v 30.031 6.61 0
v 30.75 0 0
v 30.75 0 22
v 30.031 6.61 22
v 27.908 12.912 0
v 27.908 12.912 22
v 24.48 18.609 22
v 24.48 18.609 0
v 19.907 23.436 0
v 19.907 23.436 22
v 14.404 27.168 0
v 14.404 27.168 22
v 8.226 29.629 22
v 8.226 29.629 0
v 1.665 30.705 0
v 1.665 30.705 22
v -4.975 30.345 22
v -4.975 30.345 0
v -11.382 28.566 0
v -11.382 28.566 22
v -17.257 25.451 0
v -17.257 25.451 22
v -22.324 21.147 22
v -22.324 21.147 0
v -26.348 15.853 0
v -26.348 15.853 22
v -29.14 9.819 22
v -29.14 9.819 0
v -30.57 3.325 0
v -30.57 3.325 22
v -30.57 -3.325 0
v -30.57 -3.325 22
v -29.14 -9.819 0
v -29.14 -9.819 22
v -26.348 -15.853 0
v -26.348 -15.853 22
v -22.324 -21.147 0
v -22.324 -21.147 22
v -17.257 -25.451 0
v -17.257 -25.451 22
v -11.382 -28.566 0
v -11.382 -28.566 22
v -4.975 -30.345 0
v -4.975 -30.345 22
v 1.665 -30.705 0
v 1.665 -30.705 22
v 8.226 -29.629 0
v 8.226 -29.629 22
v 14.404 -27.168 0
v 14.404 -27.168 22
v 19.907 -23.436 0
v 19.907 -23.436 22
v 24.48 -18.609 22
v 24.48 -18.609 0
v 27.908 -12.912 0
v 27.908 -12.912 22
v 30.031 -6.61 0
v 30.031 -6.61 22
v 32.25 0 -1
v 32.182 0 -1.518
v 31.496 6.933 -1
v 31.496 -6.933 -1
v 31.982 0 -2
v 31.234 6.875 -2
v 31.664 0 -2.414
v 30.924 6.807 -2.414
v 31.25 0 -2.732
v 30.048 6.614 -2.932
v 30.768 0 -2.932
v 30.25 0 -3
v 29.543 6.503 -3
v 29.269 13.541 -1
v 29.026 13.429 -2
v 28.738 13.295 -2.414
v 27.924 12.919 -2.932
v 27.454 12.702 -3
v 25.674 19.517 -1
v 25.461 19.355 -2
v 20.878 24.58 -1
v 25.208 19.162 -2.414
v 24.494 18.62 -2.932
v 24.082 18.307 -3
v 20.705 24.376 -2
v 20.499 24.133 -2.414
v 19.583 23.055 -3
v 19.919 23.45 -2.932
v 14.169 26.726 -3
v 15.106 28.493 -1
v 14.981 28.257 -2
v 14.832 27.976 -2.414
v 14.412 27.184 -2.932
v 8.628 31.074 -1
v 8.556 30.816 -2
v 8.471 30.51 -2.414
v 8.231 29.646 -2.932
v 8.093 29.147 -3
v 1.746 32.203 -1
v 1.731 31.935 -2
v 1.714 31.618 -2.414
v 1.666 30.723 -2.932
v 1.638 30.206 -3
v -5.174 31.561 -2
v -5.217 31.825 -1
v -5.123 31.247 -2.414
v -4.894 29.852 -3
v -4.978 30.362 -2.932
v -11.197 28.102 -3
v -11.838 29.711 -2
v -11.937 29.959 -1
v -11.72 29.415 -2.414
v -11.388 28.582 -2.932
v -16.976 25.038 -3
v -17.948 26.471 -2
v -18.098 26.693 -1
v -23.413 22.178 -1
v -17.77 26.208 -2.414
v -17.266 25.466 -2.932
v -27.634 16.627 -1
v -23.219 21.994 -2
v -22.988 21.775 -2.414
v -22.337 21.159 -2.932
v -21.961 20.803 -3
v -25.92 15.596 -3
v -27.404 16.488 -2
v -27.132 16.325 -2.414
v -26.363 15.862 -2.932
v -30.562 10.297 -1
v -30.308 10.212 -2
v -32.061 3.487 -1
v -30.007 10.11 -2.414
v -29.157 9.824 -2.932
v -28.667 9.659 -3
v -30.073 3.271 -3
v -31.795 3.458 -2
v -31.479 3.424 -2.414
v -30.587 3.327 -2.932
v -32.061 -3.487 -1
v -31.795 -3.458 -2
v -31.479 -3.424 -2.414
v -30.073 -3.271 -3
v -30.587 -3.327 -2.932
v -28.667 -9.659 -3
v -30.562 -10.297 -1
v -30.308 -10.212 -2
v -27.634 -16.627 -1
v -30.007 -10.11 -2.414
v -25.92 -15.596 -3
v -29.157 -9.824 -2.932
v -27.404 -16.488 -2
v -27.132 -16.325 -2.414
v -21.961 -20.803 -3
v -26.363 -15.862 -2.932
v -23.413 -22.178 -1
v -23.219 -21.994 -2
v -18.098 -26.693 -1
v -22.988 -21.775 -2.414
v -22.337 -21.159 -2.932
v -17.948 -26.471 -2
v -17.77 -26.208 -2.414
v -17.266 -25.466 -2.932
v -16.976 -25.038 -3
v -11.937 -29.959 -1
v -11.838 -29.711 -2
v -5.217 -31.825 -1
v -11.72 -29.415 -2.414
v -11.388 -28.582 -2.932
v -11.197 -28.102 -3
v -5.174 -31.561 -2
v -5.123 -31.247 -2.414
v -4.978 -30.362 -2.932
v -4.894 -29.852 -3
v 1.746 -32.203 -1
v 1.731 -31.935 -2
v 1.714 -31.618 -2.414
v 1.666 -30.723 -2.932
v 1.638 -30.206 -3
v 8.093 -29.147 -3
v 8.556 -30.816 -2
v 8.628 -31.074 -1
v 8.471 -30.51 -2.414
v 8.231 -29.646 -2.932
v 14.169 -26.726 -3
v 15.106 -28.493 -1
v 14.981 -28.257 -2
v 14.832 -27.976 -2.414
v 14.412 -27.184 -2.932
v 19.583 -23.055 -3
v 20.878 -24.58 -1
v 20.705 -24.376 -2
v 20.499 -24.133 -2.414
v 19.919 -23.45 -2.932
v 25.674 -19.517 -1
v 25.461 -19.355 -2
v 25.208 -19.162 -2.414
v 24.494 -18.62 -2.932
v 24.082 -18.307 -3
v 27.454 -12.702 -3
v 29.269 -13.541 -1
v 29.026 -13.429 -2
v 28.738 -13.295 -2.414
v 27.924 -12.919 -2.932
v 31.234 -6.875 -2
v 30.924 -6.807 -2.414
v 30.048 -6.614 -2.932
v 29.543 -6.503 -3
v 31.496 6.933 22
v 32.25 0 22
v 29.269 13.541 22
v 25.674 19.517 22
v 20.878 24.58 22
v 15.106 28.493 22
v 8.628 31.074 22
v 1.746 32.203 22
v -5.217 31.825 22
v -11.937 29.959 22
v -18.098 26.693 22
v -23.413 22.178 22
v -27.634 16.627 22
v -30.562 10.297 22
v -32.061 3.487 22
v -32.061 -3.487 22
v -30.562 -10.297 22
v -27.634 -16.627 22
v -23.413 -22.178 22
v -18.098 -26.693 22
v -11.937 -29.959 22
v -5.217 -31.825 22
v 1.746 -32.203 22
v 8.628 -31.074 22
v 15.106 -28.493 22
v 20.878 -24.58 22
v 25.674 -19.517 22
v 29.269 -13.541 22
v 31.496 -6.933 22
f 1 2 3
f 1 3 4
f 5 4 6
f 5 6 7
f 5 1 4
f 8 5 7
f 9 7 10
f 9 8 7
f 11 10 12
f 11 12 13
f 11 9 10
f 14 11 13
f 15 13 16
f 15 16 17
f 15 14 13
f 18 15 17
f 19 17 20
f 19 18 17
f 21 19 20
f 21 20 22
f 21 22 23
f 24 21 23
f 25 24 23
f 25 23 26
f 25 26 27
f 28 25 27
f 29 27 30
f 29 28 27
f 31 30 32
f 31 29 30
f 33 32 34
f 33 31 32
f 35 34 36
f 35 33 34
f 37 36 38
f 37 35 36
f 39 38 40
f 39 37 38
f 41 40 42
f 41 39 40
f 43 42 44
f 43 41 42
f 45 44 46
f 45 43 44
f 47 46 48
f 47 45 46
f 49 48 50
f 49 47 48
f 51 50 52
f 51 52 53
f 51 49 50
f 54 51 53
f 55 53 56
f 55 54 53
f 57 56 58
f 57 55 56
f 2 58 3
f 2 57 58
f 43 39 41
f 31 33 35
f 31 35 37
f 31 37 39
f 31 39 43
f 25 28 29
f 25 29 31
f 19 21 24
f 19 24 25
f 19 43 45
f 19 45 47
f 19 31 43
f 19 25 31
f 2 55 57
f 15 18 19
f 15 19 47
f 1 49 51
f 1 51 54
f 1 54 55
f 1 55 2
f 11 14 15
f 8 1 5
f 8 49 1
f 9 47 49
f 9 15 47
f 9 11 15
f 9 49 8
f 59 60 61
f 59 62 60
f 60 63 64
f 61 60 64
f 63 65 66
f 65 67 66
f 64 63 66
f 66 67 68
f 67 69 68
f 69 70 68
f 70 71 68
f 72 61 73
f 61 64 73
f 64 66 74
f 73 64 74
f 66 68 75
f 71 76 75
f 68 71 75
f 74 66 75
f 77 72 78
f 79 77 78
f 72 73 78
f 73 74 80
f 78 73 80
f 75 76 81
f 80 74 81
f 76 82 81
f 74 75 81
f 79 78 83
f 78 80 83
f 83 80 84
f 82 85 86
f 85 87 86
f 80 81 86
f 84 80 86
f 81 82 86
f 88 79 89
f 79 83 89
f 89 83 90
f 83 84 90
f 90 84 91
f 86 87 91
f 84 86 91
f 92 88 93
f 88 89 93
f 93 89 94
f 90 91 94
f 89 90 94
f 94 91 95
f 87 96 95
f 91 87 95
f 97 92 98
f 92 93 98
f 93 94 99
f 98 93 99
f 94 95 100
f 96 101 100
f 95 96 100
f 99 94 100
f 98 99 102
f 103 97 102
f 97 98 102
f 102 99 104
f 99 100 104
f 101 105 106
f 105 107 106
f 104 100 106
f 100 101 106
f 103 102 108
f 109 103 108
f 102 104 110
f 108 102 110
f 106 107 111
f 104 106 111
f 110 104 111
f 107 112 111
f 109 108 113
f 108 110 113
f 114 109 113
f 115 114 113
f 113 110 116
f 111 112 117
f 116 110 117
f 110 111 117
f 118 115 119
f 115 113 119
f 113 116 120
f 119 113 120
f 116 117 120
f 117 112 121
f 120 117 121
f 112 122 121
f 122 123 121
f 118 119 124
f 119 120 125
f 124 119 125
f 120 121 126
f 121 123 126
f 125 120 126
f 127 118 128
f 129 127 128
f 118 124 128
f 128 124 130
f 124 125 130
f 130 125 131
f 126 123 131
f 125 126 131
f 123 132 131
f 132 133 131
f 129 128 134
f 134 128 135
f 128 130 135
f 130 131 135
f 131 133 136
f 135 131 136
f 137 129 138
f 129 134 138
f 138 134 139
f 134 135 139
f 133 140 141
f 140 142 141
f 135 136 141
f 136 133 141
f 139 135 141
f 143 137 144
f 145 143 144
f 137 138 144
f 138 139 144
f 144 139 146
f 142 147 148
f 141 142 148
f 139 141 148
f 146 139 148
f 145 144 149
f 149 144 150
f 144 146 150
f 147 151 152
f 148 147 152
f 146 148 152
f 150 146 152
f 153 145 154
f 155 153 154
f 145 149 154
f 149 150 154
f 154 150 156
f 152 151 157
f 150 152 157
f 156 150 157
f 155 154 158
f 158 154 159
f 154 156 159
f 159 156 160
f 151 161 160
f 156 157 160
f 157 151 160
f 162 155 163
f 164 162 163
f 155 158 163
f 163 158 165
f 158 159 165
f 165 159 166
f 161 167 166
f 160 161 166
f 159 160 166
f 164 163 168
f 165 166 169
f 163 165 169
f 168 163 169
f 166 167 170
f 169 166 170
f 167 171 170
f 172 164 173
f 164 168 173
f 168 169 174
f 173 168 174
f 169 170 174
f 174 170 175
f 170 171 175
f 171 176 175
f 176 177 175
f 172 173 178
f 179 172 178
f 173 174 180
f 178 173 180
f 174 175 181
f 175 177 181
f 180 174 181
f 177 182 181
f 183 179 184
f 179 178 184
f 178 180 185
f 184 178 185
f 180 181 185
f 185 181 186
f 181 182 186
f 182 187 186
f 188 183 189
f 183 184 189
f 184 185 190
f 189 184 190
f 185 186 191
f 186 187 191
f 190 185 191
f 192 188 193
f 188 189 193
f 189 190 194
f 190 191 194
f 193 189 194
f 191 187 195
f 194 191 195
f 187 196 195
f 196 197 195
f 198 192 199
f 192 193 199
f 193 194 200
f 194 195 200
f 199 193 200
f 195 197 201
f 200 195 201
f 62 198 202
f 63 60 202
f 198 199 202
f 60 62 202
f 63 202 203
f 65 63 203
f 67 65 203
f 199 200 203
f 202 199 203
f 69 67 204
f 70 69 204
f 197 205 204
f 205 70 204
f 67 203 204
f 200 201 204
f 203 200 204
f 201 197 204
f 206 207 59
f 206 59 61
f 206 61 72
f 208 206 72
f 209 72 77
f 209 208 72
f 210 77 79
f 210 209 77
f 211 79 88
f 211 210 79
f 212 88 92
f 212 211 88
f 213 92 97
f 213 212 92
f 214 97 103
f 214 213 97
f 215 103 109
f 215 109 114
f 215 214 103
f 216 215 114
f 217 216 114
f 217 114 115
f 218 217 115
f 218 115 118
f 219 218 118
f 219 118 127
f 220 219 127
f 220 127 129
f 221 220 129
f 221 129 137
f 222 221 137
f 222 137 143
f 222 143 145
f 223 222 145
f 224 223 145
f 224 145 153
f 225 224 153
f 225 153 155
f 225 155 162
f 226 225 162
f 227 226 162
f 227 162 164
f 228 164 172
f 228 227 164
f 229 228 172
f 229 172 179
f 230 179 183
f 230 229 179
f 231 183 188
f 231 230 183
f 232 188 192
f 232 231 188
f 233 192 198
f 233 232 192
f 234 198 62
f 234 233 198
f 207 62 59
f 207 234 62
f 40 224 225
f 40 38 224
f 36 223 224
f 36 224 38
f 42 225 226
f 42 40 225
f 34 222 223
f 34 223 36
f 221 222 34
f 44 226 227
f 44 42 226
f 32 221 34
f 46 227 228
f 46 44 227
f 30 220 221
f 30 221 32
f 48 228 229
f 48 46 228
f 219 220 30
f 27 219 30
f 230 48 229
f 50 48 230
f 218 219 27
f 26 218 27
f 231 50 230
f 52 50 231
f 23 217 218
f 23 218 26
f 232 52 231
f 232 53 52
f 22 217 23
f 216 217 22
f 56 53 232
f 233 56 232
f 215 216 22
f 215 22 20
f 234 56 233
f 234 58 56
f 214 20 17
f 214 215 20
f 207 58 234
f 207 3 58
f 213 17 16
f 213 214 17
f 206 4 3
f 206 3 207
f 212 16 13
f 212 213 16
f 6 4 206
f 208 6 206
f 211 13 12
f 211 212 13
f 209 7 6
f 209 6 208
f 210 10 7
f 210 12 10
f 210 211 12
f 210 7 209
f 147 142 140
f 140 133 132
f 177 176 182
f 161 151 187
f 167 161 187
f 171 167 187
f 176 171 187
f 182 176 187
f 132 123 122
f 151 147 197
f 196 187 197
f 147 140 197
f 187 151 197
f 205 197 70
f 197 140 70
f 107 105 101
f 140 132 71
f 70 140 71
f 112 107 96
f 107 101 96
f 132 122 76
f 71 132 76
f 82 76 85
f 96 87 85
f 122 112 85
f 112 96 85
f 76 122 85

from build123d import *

# Parameters (mm, degrees)
F0_R     = 32.25
F0_R_2   = 30.75
F1_DEPTH = 22
F2_R     = 32.25
F3_DEPTH = 3
F4_R     = 2


with BuildPart() as f1:
    # F0 (on Top) → F1 (new body)
    with BuildSketch(Plane.XY):
        Circle(F0_R)
        Circle(F0_R_2, mode=Mode.SUBTRACT)
    extrude(amount=F1_DEPTH)

    # F2 (on Top) → F3 (join)
    with BuildSketch(Plane.XY):
        Circle(F2_R)
    extrude(amount=-F3_DEPTH)

    # F4
    f4_edges = [f1.edges().sort_by_distance(p)[0] for p in [
        (-32.25, 0, -3),
    ]]
    fillet(f4_edges, radius=F4_R)


solid = f1.part
